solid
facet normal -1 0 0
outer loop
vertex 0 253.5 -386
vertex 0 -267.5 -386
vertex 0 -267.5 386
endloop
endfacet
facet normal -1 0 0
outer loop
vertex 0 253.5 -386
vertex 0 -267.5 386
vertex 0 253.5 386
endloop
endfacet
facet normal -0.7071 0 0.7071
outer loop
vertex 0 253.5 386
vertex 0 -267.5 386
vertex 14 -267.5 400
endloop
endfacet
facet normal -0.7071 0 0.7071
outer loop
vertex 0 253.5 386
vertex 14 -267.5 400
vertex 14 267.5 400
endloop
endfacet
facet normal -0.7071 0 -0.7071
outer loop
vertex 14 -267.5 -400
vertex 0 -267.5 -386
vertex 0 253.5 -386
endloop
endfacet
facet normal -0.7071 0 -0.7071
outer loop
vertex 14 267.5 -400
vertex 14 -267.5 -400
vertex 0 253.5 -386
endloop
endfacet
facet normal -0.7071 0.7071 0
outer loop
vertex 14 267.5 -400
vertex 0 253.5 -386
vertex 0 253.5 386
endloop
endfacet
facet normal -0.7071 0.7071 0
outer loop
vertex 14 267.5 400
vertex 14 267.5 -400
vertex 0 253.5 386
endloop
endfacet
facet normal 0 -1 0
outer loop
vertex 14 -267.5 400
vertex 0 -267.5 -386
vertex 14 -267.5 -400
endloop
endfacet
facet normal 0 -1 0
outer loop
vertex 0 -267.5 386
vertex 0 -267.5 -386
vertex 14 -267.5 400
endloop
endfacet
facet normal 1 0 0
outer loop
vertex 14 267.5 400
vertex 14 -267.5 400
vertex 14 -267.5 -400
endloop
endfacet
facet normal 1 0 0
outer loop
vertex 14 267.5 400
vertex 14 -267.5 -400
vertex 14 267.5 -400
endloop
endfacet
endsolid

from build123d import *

# Parameters (mm, degrees)
F0_W     = 535
F0_H     = 800
F1_DEPTH = 14
F2_SIZE  = 13.99999


# Not quite as in the source:
# - a fillet or chamfer is up to 0.001 mm smaller than in the source, because OpenCascade refuses the exact size


with BuildPart() as f1:
    # F0 (on Right) → F1 (new body)
    with BuildSketch(Plane.YZ):
        Rectangle(F0_W, F0_H)
    extrude(amount=F1_DEPTH)

    # F2 (size 14 in the source; OpenCascade refuses exactly that, so slightly less here)
    f2_edges = [f1.edges().sort_by_distance(p)[0] for p in [
        (0, 0, 400),
        (0, 267.5, 0),
        (0, 0, -400),
    ]]
    chamfer(f2_edges, length=F2_SIZE)


solid = f1.part
